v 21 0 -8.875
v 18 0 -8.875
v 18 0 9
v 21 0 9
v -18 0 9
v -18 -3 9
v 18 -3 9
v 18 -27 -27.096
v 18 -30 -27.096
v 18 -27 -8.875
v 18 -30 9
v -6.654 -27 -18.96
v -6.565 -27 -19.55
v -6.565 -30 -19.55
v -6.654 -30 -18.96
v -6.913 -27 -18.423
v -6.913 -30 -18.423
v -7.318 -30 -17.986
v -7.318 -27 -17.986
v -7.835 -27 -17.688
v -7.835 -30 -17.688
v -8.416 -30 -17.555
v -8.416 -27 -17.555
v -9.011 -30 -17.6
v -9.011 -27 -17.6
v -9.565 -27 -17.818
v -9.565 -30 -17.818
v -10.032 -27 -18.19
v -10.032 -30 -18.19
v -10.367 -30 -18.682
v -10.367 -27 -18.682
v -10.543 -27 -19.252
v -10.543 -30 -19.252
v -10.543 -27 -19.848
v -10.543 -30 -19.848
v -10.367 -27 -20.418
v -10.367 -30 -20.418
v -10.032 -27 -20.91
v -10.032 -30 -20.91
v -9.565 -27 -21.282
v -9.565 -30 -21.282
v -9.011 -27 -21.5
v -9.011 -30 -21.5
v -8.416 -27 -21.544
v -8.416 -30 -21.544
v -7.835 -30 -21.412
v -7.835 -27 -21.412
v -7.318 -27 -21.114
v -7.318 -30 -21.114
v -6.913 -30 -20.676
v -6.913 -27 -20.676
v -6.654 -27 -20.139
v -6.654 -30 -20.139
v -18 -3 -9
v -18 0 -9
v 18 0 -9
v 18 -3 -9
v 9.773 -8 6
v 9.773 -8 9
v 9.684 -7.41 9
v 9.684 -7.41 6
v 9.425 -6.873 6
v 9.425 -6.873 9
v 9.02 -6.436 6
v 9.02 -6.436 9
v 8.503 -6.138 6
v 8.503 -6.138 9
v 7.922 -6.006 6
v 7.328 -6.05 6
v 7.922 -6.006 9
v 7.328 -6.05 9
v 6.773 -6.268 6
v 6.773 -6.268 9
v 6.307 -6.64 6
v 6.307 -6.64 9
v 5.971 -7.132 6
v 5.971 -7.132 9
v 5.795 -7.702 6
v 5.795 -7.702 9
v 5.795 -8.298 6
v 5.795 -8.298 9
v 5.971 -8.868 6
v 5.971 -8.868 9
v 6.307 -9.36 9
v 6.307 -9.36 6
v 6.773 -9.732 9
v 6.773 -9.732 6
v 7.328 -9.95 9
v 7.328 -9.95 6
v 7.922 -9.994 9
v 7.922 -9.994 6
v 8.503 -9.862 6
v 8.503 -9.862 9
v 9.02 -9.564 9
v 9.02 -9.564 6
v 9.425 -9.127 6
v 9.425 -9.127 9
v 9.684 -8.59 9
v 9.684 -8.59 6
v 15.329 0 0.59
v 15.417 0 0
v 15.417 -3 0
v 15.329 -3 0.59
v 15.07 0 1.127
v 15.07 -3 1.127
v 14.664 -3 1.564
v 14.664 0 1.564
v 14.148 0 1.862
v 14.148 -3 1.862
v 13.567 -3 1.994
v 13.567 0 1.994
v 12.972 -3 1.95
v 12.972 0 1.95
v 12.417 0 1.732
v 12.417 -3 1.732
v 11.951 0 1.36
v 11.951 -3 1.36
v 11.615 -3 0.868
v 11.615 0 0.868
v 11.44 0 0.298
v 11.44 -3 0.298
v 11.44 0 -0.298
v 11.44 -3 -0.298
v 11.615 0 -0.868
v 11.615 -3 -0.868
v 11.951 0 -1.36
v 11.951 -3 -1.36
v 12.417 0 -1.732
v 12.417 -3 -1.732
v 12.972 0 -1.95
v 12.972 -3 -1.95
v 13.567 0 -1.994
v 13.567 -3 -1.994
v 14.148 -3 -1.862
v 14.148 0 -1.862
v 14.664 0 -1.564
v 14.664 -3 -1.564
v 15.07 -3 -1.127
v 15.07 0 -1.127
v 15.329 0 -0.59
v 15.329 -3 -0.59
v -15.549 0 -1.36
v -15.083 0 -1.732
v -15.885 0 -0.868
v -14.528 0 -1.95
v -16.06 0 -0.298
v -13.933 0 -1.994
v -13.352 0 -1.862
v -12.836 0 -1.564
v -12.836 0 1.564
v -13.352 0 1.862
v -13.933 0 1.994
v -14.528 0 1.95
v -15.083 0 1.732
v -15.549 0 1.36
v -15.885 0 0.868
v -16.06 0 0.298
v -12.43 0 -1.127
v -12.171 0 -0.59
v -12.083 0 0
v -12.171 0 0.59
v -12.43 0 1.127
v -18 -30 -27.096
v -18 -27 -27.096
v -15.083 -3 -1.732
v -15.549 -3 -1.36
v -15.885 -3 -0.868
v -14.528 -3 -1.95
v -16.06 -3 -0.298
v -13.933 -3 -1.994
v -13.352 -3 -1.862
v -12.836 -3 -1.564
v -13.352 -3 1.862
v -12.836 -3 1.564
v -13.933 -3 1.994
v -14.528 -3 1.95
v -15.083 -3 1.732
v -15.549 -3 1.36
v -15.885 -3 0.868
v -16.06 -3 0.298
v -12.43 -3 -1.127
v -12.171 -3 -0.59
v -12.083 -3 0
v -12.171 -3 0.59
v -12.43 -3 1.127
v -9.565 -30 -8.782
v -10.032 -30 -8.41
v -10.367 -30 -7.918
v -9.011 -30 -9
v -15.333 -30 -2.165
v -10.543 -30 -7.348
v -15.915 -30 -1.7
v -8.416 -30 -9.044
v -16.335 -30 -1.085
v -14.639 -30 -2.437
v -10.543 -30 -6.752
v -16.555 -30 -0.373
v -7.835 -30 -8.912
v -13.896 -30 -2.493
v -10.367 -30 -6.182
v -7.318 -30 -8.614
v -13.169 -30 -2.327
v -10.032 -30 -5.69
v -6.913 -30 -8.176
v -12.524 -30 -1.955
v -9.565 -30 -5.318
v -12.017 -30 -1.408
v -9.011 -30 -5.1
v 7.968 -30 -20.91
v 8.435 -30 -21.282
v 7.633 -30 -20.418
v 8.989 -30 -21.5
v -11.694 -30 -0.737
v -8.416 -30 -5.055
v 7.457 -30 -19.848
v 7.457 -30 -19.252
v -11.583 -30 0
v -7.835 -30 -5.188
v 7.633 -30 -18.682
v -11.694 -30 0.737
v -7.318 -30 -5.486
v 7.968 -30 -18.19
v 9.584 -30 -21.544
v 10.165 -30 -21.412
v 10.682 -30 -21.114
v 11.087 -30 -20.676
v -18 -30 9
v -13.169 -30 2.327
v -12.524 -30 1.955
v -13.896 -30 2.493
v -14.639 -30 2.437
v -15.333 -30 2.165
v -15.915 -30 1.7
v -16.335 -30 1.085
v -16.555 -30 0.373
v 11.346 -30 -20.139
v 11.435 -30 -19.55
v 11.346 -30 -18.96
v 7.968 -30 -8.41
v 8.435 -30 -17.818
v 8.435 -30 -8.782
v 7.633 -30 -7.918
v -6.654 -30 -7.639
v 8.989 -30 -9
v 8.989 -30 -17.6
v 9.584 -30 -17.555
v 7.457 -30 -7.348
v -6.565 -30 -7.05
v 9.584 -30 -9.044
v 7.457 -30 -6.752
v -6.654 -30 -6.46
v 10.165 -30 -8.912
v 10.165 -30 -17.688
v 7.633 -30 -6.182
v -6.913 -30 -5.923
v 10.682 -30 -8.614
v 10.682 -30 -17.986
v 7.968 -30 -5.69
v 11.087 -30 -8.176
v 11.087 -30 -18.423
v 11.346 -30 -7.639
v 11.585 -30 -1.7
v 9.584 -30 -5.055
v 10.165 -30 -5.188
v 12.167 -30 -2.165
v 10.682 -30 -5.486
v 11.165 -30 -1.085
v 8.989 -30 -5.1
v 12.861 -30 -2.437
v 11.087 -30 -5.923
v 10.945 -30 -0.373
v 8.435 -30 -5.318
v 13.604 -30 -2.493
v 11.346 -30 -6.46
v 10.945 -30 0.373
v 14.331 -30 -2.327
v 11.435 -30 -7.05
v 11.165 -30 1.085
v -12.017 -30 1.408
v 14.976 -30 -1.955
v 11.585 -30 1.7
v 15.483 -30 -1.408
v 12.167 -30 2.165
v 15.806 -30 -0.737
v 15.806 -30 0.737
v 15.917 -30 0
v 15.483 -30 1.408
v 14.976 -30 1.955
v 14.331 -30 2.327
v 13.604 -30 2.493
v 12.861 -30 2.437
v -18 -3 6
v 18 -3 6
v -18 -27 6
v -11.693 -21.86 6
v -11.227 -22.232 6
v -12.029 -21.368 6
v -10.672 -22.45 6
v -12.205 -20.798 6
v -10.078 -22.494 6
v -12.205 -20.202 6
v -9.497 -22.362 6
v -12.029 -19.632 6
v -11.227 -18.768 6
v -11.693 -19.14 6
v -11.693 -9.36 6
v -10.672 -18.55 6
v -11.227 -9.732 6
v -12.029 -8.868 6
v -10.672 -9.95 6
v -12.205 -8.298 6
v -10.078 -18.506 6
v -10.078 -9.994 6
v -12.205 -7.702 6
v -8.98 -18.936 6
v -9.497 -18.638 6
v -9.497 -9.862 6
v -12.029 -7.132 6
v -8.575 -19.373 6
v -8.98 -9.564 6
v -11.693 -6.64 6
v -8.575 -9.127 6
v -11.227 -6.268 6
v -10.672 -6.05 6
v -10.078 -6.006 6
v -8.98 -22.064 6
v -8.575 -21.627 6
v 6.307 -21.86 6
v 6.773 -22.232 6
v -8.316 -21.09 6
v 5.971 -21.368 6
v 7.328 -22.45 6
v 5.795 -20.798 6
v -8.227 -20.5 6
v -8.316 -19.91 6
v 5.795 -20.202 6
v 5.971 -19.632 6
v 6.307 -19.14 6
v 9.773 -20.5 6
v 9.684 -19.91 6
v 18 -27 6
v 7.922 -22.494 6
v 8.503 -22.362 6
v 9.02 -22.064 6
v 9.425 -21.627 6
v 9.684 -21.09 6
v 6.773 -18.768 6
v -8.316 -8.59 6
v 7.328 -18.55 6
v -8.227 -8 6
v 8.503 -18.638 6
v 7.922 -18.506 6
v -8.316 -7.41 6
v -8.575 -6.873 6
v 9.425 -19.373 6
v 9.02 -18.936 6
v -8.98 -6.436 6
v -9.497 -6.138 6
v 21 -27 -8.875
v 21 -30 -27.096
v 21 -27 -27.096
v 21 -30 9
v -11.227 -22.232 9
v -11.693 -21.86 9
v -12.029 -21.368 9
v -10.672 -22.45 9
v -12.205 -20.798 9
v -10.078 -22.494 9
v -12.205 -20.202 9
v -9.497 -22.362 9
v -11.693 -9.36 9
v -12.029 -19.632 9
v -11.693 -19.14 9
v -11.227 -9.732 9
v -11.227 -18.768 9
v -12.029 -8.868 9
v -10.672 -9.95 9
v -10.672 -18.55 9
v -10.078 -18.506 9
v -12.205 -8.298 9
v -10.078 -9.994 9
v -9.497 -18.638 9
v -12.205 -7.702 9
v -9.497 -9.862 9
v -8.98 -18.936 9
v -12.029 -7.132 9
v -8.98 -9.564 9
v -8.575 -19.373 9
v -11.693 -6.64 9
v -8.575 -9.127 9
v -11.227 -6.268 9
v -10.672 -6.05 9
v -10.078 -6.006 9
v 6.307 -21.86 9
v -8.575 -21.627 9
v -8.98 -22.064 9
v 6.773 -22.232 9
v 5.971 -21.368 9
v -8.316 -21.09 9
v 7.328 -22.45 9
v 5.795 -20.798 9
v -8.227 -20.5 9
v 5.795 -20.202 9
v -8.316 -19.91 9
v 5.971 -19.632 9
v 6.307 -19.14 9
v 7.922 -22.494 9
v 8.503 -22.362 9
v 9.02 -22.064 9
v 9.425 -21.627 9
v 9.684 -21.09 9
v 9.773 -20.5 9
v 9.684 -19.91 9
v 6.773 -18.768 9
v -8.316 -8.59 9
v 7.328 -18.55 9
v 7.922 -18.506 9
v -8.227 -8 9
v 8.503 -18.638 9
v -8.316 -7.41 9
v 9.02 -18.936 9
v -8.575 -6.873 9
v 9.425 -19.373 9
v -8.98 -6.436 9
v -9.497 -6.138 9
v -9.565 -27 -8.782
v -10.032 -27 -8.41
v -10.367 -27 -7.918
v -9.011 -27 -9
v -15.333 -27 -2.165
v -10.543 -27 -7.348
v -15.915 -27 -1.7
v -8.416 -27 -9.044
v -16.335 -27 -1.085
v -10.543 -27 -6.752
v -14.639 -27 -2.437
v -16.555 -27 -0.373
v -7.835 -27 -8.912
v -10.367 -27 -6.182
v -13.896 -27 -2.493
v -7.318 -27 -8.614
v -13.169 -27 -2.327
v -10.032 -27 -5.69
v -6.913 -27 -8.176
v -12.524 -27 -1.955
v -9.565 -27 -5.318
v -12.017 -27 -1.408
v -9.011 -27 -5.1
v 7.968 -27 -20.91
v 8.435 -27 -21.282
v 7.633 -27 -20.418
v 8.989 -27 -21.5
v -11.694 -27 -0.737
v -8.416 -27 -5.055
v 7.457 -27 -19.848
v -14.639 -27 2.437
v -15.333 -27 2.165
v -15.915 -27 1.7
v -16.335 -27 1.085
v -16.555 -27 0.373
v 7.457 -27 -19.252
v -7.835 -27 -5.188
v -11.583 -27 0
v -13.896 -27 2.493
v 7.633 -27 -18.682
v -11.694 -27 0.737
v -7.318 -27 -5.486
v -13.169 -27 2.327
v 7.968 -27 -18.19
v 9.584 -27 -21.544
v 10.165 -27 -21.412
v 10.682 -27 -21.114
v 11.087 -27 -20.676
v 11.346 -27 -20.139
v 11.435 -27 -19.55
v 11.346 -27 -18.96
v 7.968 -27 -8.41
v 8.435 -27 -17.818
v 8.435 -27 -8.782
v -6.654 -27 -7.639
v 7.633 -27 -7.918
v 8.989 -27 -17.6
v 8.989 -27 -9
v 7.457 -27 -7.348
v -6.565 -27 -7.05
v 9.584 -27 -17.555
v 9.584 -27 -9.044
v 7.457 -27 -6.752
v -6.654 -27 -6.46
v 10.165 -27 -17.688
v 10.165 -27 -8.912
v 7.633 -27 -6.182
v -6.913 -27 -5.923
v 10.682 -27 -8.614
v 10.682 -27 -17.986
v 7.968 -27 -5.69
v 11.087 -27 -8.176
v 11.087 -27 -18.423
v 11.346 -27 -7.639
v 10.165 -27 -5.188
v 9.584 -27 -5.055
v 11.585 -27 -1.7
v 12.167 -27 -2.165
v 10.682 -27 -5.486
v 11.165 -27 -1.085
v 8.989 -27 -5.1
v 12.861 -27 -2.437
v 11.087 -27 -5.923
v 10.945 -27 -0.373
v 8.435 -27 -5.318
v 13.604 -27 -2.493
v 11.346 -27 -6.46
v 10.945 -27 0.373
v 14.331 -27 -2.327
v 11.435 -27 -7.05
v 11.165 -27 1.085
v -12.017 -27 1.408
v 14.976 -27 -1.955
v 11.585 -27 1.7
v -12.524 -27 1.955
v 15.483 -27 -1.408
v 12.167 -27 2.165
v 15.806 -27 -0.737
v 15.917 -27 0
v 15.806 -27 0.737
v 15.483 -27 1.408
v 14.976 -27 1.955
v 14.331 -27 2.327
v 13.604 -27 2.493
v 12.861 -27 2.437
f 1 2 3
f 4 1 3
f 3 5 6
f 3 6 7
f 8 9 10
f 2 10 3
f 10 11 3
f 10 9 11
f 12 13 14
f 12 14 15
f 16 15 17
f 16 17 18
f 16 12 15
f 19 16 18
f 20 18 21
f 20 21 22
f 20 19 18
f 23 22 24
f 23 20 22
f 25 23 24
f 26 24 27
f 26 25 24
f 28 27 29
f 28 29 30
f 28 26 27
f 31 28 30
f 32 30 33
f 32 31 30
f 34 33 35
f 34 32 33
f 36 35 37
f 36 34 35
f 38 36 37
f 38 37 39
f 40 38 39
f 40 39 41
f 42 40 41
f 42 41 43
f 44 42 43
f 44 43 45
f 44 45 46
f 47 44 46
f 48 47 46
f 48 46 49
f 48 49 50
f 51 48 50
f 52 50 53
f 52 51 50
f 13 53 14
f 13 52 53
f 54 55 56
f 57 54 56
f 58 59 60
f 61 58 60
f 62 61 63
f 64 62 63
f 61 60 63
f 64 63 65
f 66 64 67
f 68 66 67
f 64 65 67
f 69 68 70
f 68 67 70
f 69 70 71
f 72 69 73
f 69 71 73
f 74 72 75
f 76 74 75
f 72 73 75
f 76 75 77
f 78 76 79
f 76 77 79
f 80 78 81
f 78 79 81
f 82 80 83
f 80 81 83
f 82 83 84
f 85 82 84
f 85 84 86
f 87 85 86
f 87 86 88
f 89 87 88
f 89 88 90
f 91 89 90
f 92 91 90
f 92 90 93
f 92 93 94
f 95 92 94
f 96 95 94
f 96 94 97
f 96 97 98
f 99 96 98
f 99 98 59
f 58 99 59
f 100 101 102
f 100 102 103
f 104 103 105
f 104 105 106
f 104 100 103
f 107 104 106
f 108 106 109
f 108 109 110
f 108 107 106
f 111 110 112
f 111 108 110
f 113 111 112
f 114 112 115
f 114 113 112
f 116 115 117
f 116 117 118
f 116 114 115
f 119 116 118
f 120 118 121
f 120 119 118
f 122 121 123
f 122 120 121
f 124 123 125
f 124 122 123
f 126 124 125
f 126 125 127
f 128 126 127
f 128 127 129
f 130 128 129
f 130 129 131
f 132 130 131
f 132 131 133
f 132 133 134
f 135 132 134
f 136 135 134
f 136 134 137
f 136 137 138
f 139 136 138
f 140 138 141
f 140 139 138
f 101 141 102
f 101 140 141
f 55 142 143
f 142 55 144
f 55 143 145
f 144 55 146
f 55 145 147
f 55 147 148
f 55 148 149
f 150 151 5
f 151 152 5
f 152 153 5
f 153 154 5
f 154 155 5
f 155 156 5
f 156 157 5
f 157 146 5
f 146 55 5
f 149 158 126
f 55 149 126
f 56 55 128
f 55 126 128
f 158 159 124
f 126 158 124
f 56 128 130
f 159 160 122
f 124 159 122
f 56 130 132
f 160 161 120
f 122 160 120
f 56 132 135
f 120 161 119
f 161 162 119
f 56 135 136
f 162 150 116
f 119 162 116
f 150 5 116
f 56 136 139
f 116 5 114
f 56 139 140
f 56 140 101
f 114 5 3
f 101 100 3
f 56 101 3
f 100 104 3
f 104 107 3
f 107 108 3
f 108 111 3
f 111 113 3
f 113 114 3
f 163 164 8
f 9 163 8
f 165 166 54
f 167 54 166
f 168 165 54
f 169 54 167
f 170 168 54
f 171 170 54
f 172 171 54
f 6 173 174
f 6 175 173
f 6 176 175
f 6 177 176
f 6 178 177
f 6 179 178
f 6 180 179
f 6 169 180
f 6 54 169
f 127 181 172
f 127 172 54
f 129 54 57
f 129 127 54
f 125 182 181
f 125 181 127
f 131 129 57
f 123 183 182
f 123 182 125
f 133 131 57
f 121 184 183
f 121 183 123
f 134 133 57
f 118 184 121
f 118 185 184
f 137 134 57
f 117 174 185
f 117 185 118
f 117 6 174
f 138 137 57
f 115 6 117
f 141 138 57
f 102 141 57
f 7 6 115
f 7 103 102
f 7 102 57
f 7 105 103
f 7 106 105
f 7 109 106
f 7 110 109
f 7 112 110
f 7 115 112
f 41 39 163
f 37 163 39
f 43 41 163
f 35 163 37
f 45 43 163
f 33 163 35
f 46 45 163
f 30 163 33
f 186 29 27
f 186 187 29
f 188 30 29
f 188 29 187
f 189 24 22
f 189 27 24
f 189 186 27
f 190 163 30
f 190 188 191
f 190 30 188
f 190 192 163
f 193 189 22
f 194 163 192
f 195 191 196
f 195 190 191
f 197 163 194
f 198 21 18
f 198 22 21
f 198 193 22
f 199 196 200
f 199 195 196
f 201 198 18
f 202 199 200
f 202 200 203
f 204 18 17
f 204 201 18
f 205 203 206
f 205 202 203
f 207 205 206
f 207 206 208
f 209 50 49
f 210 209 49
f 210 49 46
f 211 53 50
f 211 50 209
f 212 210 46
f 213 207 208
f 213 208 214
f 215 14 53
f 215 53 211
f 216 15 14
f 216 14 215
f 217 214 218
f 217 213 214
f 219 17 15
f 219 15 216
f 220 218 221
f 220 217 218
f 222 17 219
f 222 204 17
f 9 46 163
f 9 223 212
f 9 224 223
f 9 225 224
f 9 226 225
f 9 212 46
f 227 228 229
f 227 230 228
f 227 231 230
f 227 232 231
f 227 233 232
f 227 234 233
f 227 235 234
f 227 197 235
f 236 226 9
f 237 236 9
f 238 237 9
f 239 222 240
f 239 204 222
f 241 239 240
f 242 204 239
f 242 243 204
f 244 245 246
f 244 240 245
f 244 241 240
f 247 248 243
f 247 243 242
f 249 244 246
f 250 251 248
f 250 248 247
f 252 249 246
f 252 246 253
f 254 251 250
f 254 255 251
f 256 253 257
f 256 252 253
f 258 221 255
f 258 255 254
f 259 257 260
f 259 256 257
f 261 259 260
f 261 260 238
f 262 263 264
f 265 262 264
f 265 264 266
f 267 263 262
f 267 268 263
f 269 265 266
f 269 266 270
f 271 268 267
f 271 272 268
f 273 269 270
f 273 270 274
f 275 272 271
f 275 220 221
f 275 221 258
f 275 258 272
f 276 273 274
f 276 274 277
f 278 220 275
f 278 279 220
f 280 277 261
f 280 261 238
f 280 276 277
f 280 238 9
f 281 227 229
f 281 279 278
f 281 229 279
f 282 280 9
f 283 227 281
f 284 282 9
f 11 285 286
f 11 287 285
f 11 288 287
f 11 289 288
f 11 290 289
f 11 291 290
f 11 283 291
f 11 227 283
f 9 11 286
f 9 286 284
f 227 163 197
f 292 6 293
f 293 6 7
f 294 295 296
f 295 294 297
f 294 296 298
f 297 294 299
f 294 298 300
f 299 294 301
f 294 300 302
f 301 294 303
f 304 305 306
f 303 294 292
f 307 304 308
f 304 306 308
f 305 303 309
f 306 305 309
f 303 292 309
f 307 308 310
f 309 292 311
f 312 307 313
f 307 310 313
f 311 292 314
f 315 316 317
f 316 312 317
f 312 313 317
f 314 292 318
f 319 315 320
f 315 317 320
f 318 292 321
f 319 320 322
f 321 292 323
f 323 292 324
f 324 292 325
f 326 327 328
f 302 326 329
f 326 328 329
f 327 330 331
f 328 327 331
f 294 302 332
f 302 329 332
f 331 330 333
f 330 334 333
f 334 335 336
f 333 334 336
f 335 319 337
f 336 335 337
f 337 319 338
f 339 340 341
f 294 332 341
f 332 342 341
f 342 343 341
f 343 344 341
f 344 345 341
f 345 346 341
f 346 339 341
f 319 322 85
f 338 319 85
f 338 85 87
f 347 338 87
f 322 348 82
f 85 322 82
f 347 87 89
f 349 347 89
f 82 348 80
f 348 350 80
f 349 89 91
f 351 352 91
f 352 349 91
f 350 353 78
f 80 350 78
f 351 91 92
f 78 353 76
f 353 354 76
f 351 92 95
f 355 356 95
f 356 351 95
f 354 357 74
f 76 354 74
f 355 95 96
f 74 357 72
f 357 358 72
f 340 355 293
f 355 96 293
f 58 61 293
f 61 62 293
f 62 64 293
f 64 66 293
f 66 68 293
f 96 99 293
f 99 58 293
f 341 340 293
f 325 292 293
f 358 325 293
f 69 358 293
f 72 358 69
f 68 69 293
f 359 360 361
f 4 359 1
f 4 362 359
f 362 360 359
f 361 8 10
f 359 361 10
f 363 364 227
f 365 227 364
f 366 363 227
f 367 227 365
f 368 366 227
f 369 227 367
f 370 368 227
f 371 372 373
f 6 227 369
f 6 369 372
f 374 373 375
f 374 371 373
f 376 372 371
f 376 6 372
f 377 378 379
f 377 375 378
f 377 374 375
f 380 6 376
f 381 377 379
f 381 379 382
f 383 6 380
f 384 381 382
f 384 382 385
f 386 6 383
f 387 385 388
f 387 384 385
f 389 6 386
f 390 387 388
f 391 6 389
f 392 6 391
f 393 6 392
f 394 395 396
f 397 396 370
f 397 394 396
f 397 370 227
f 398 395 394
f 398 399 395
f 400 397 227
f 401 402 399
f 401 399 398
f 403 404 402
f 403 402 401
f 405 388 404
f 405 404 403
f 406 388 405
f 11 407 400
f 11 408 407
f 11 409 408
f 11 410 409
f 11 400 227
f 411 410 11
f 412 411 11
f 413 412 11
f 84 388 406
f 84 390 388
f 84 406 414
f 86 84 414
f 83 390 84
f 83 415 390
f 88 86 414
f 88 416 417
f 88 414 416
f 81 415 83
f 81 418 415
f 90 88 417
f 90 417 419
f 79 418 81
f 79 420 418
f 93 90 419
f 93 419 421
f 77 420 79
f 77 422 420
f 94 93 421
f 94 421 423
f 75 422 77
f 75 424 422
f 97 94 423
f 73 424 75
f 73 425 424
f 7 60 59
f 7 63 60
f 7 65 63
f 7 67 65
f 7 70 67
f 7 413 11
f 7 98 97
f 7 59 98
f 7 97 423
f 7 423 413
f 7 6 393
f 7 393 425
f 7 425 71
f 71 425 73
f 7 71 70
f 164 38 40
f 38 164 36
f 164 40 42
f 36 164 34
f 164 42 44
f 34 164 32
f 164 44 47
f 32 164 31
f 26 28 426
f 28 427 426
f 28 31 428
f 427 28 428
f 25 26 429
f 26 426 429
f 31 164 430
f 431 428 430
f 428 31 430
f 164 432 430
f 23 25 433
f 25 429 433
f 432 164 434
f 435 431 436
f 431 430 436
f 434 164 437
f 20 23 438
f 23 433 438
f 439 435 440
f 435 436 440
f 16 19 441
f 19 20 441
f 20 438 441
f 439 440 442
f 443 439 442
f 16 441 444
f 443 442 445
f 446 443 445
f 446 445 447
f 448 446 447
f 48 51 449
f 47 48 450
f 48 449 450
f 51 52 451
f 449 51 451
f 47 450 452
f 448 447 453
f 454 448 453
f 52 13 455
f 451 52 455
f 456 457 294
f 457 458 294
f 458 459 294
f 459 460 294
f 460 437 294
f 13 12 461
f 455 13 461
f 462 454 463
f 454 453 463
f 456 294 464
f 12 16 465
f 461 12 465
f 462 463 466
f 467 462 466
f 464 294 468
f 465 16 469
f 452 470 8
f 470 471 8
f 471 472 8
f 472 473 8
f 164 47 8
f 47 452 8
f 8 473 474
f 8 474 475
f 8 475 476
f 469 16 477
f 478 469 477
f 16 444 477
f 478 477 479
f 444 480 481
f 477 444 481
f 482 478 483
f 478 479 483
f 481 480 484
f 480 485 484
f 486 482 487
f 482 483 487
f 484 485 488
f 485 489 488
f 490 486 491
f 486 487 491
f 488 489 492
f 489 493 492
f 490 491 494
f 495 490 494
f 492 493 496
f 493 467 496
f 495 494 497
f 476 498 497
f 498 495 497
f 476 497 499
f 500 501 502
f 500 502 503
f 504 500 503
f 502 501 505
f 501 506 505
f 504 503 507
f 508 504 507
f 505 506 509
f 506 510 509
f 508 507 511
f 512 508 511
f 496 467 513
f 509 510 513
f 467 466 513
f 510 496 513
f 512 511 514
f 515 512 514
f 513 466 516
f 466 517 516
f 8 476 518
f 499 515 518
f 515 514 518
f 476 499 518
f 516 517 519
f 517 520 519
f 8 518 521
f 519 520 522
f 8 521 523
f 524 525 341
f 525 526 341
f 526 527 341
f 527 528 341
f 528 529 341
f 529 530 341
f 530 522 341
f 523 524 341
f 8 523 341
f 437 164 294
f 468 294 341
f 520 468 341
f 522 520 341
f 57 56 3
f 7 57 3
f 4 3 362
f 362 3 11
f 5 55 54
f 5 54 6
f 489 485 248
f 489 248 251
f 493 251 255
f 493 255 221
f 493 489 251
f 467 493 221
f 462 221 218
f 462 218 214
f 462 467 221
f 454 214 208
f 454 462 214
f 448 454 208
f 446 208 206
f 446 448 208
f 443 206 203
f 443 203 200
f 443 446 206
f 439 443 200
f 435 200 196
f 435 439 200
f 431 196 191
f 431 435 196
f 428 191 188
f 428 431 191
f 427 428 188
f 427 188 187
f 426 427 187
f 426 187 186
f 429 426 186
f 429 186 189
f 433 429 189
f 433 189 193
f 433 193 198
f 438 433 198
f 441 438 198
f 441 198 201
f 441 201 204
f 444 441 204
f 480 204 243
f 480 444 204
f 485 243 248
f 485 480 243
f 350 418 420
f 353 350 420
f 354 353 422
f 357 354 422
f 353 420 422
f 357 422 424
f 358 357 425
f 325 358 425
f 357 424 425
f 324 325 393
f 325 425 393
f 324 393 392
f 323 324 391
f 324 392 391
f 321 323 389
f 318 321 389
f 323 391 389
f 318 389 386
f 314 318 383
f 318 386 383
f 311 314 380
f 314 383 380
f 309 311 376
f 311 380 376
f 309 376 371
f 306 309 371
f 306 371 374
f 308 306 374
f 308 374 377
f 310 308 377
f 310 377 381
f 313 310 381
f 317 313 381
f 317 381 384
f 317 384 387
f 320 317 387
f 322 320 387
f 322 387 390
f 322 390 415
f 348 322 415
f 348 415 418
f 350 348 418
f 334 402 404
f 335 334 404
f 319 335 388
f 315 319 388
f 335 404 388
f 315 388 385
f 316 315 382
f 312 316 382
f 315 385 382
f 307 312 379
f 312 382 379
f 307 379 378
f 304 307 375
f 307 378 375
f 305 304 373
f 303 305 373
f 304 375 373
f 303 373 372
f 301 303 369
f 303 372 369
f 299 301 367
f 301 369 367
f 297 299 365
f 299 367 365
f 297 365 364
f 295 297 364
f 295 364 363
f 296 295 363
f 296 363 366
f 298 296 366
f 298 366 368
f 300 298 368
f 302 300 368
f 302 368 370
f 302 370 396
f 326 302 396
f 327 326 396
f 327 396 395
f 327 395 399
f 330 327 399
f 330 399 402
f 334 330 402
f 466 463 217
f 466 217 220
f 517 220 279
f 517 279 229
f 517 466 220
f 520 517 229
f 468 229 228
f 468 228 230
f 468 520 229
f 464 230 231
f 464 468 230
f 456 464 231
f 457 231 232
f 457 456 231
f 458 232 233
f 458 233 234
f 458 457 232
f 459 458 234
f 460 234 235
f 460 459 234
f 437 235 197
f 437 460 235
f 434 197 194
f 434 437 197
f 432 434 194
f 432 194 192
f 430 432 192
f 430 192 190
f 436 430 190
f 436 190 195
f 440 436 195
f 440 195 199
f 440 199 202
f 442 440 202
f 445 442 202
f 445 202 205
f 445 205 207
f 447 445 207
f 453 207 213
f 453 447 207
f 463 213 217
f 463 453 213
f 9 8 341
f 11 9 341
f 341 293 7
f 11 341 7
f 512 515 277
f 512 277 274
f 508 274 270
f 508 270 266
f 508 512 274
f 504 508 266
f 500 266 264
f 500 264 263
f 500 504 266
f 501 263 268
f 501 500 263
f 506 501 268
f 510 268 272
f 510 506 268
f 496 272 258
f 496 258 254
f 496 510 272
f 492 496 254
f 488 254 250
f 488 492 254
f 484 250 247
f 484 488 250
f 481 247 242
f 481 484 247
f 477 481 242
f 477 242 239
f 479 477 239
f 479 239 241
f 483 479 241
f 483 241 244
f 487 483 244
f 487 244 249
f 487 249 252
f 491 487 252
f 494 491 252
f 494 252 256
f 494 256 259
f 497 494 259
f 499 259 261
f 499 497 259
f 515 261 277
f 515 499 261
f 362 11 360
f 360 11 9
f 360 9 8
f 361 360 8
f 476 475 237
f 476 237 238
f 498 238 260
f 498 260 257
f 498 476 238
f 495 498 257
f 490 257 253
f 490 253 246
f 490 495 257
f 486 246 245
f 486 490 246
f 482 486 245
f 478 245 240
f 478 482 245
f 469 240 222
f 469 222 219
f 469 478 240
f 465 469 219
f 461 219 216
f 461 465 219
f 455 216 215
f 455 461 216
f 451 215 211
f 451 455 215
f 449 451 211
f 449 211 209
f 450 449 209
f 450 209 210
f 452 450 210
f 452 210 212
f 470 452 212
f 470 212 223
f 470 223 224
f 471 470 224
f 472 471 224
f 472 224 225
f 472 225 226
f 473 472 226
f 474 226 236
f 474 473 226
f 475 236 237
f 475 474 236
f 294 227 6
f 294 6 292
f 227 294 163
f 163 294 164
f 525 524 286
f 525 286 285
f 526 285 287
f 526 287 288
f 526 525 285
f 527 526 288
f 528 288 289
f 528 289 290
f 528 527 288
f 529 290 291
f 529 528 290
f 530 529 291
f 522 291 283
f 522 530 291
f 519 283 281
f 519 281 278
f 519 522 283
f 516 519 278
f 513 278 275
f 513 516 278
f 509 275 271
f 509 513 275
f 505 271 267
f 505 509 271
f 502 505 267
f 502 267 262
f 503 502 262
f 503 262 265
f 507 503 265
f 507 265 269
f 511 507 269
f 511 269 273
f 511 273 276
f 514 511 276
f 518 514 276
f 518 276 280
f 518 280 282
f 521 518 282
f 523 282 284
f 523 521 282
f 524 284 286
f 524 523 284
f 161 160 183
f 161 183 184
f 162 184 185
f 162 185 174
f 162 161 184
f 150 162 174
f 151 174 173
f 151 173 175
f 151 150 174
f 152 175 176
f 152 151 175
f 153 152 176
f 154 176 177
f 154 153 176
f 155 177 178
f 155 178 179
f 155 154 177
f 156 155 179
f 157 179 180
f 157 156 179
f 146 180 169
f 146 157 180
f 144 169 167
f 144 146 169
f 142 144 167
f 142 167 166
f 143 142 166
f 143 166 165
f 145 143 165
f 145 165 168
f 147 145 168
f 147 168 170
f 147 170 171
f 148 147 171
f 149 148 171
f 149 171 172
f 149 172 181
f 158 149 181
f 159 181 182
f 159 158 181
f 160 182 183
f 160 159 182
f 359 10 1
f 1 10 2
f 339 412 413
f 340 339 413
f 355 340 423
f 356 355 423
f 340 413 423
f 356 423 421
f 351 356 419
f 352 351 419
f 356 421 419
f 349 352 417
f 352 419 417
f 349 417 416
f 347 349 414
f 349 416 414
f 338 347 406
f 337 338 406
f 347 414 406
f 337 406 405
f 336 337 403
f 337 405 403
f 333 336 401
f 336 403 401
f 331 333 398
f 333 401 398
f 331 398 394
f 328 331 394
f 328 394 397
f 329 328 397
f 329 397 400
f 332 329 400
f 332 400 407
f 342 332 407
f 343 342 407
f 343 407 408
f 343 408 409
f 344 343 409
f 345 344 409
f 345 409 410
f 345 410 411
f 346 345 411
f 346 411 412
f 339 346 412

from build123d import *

# Parameters (mm, degrees)
F0_W     = 36
F0_H     = 18
F0_R     = 2
F1_DEPTH = 3
F2_W     = 36
F2_H     = 3
F3_DEPTH = 24
F4_R     = 2
F5_DEPTH = 25
F6_W     = 36
F6_H     = 33.095895
F6_R     = 2
F6_R_2   = 2.5
F6_H_2   = 3
F7_DEPTH = 3
F9_DEPTH = 3


with BuildPart() as f1:
    # F0 (on Front) → F1 (new body)
    with BuildSketch(Plane.XZ):
        Rectangle(F0_W, F0_H)
        with Locations((-14.082598, 0)):
            Circle(F0_R, mode=Mode.SUBTRACT)
        with Locations((13.417402, 0)):
            Circle(F0_R, mode=Mode.SUBTRACT)
    extrude(amount=F1_DEPTH)


with BuildPart() as f3:
    # F2 (on face) → F3 (new body)
    with BuildSketch(Plane.XZ.offset(3)):
        with Locations((0, 7.5)):
            Rectangle(F2_W, F2_H)
    extrude(amount=F3_DEPTH)

    # F4 (on face) → F5 (cut)
    with BuildSketch(Plane.XY.offset(9)):
        with Locations((-10.227273, -8)):
            Circle(F4_R)
        with Locations((-10.227273, -20.5)):
            Circle(F4_R)
        with Locations((7.772727, -20.5)):
            Circle(F4_R)
        with Locations((7.772727, -8)):
            Circle(F4_R)
    extrude(amount=-F5_DEPTH, mode=Mode.SUBTRACT)

    # F6 (on face) → F7 (join)
    with BuildSketch(Plane.XZ.offset(27)):
        with Locations((0, -10.547947)):
            Rectangle(F6_W, F6_H)
        with Locations((-8.565474, -19.549852)):
            Circle(F6_R, mode=Mode.SUBTRACT)
        with Locations((9.434526, -19.549852)):
            Circle(F6_R, mode=Mode.SUBTRACT)
        with Locations((-8.565474, -7.049852)):
            Circle(F6_R, mode=Mode.SUBTRACT)
        with Locations((-14.082598, 0)):
            Circle(F6_R_2, mode=Mode.SUBTRACT)
        with Locations((9.434526, -7.049852)):
            Circle(F6_R, mode=Mode.SUBTRACT)
        with Locations((13.417402, 0)):
            Circle(F6_R_2, mode=Mode.SUBTRACT)
        with Locations((0, 7.5)):
            Rectangle(F6_W, F6_H_2)
    extrude(amount=F7_DEPTH)


with BuildPart() as f9:
    # F8 (on face) → F9 (new body)
    with BuildSketch(Plane.YZ.offset(18)):
        Polygon((0, 9), (-3, 9), (-3, 6), (-27, 6), (-27, -8.874884), (-3, -8.874884), (0, -8.874884), align=None)
        Polygon((-30, 9), (-30, -27.095895), (-27, -27.095895), (-27, -8.874884), (-27, 6), (-3, 6), (-3, 9), align=None)
    extrude(amount=F9_DEPTH)


solid = Compound([f1.part, f3.part, f9.part])
